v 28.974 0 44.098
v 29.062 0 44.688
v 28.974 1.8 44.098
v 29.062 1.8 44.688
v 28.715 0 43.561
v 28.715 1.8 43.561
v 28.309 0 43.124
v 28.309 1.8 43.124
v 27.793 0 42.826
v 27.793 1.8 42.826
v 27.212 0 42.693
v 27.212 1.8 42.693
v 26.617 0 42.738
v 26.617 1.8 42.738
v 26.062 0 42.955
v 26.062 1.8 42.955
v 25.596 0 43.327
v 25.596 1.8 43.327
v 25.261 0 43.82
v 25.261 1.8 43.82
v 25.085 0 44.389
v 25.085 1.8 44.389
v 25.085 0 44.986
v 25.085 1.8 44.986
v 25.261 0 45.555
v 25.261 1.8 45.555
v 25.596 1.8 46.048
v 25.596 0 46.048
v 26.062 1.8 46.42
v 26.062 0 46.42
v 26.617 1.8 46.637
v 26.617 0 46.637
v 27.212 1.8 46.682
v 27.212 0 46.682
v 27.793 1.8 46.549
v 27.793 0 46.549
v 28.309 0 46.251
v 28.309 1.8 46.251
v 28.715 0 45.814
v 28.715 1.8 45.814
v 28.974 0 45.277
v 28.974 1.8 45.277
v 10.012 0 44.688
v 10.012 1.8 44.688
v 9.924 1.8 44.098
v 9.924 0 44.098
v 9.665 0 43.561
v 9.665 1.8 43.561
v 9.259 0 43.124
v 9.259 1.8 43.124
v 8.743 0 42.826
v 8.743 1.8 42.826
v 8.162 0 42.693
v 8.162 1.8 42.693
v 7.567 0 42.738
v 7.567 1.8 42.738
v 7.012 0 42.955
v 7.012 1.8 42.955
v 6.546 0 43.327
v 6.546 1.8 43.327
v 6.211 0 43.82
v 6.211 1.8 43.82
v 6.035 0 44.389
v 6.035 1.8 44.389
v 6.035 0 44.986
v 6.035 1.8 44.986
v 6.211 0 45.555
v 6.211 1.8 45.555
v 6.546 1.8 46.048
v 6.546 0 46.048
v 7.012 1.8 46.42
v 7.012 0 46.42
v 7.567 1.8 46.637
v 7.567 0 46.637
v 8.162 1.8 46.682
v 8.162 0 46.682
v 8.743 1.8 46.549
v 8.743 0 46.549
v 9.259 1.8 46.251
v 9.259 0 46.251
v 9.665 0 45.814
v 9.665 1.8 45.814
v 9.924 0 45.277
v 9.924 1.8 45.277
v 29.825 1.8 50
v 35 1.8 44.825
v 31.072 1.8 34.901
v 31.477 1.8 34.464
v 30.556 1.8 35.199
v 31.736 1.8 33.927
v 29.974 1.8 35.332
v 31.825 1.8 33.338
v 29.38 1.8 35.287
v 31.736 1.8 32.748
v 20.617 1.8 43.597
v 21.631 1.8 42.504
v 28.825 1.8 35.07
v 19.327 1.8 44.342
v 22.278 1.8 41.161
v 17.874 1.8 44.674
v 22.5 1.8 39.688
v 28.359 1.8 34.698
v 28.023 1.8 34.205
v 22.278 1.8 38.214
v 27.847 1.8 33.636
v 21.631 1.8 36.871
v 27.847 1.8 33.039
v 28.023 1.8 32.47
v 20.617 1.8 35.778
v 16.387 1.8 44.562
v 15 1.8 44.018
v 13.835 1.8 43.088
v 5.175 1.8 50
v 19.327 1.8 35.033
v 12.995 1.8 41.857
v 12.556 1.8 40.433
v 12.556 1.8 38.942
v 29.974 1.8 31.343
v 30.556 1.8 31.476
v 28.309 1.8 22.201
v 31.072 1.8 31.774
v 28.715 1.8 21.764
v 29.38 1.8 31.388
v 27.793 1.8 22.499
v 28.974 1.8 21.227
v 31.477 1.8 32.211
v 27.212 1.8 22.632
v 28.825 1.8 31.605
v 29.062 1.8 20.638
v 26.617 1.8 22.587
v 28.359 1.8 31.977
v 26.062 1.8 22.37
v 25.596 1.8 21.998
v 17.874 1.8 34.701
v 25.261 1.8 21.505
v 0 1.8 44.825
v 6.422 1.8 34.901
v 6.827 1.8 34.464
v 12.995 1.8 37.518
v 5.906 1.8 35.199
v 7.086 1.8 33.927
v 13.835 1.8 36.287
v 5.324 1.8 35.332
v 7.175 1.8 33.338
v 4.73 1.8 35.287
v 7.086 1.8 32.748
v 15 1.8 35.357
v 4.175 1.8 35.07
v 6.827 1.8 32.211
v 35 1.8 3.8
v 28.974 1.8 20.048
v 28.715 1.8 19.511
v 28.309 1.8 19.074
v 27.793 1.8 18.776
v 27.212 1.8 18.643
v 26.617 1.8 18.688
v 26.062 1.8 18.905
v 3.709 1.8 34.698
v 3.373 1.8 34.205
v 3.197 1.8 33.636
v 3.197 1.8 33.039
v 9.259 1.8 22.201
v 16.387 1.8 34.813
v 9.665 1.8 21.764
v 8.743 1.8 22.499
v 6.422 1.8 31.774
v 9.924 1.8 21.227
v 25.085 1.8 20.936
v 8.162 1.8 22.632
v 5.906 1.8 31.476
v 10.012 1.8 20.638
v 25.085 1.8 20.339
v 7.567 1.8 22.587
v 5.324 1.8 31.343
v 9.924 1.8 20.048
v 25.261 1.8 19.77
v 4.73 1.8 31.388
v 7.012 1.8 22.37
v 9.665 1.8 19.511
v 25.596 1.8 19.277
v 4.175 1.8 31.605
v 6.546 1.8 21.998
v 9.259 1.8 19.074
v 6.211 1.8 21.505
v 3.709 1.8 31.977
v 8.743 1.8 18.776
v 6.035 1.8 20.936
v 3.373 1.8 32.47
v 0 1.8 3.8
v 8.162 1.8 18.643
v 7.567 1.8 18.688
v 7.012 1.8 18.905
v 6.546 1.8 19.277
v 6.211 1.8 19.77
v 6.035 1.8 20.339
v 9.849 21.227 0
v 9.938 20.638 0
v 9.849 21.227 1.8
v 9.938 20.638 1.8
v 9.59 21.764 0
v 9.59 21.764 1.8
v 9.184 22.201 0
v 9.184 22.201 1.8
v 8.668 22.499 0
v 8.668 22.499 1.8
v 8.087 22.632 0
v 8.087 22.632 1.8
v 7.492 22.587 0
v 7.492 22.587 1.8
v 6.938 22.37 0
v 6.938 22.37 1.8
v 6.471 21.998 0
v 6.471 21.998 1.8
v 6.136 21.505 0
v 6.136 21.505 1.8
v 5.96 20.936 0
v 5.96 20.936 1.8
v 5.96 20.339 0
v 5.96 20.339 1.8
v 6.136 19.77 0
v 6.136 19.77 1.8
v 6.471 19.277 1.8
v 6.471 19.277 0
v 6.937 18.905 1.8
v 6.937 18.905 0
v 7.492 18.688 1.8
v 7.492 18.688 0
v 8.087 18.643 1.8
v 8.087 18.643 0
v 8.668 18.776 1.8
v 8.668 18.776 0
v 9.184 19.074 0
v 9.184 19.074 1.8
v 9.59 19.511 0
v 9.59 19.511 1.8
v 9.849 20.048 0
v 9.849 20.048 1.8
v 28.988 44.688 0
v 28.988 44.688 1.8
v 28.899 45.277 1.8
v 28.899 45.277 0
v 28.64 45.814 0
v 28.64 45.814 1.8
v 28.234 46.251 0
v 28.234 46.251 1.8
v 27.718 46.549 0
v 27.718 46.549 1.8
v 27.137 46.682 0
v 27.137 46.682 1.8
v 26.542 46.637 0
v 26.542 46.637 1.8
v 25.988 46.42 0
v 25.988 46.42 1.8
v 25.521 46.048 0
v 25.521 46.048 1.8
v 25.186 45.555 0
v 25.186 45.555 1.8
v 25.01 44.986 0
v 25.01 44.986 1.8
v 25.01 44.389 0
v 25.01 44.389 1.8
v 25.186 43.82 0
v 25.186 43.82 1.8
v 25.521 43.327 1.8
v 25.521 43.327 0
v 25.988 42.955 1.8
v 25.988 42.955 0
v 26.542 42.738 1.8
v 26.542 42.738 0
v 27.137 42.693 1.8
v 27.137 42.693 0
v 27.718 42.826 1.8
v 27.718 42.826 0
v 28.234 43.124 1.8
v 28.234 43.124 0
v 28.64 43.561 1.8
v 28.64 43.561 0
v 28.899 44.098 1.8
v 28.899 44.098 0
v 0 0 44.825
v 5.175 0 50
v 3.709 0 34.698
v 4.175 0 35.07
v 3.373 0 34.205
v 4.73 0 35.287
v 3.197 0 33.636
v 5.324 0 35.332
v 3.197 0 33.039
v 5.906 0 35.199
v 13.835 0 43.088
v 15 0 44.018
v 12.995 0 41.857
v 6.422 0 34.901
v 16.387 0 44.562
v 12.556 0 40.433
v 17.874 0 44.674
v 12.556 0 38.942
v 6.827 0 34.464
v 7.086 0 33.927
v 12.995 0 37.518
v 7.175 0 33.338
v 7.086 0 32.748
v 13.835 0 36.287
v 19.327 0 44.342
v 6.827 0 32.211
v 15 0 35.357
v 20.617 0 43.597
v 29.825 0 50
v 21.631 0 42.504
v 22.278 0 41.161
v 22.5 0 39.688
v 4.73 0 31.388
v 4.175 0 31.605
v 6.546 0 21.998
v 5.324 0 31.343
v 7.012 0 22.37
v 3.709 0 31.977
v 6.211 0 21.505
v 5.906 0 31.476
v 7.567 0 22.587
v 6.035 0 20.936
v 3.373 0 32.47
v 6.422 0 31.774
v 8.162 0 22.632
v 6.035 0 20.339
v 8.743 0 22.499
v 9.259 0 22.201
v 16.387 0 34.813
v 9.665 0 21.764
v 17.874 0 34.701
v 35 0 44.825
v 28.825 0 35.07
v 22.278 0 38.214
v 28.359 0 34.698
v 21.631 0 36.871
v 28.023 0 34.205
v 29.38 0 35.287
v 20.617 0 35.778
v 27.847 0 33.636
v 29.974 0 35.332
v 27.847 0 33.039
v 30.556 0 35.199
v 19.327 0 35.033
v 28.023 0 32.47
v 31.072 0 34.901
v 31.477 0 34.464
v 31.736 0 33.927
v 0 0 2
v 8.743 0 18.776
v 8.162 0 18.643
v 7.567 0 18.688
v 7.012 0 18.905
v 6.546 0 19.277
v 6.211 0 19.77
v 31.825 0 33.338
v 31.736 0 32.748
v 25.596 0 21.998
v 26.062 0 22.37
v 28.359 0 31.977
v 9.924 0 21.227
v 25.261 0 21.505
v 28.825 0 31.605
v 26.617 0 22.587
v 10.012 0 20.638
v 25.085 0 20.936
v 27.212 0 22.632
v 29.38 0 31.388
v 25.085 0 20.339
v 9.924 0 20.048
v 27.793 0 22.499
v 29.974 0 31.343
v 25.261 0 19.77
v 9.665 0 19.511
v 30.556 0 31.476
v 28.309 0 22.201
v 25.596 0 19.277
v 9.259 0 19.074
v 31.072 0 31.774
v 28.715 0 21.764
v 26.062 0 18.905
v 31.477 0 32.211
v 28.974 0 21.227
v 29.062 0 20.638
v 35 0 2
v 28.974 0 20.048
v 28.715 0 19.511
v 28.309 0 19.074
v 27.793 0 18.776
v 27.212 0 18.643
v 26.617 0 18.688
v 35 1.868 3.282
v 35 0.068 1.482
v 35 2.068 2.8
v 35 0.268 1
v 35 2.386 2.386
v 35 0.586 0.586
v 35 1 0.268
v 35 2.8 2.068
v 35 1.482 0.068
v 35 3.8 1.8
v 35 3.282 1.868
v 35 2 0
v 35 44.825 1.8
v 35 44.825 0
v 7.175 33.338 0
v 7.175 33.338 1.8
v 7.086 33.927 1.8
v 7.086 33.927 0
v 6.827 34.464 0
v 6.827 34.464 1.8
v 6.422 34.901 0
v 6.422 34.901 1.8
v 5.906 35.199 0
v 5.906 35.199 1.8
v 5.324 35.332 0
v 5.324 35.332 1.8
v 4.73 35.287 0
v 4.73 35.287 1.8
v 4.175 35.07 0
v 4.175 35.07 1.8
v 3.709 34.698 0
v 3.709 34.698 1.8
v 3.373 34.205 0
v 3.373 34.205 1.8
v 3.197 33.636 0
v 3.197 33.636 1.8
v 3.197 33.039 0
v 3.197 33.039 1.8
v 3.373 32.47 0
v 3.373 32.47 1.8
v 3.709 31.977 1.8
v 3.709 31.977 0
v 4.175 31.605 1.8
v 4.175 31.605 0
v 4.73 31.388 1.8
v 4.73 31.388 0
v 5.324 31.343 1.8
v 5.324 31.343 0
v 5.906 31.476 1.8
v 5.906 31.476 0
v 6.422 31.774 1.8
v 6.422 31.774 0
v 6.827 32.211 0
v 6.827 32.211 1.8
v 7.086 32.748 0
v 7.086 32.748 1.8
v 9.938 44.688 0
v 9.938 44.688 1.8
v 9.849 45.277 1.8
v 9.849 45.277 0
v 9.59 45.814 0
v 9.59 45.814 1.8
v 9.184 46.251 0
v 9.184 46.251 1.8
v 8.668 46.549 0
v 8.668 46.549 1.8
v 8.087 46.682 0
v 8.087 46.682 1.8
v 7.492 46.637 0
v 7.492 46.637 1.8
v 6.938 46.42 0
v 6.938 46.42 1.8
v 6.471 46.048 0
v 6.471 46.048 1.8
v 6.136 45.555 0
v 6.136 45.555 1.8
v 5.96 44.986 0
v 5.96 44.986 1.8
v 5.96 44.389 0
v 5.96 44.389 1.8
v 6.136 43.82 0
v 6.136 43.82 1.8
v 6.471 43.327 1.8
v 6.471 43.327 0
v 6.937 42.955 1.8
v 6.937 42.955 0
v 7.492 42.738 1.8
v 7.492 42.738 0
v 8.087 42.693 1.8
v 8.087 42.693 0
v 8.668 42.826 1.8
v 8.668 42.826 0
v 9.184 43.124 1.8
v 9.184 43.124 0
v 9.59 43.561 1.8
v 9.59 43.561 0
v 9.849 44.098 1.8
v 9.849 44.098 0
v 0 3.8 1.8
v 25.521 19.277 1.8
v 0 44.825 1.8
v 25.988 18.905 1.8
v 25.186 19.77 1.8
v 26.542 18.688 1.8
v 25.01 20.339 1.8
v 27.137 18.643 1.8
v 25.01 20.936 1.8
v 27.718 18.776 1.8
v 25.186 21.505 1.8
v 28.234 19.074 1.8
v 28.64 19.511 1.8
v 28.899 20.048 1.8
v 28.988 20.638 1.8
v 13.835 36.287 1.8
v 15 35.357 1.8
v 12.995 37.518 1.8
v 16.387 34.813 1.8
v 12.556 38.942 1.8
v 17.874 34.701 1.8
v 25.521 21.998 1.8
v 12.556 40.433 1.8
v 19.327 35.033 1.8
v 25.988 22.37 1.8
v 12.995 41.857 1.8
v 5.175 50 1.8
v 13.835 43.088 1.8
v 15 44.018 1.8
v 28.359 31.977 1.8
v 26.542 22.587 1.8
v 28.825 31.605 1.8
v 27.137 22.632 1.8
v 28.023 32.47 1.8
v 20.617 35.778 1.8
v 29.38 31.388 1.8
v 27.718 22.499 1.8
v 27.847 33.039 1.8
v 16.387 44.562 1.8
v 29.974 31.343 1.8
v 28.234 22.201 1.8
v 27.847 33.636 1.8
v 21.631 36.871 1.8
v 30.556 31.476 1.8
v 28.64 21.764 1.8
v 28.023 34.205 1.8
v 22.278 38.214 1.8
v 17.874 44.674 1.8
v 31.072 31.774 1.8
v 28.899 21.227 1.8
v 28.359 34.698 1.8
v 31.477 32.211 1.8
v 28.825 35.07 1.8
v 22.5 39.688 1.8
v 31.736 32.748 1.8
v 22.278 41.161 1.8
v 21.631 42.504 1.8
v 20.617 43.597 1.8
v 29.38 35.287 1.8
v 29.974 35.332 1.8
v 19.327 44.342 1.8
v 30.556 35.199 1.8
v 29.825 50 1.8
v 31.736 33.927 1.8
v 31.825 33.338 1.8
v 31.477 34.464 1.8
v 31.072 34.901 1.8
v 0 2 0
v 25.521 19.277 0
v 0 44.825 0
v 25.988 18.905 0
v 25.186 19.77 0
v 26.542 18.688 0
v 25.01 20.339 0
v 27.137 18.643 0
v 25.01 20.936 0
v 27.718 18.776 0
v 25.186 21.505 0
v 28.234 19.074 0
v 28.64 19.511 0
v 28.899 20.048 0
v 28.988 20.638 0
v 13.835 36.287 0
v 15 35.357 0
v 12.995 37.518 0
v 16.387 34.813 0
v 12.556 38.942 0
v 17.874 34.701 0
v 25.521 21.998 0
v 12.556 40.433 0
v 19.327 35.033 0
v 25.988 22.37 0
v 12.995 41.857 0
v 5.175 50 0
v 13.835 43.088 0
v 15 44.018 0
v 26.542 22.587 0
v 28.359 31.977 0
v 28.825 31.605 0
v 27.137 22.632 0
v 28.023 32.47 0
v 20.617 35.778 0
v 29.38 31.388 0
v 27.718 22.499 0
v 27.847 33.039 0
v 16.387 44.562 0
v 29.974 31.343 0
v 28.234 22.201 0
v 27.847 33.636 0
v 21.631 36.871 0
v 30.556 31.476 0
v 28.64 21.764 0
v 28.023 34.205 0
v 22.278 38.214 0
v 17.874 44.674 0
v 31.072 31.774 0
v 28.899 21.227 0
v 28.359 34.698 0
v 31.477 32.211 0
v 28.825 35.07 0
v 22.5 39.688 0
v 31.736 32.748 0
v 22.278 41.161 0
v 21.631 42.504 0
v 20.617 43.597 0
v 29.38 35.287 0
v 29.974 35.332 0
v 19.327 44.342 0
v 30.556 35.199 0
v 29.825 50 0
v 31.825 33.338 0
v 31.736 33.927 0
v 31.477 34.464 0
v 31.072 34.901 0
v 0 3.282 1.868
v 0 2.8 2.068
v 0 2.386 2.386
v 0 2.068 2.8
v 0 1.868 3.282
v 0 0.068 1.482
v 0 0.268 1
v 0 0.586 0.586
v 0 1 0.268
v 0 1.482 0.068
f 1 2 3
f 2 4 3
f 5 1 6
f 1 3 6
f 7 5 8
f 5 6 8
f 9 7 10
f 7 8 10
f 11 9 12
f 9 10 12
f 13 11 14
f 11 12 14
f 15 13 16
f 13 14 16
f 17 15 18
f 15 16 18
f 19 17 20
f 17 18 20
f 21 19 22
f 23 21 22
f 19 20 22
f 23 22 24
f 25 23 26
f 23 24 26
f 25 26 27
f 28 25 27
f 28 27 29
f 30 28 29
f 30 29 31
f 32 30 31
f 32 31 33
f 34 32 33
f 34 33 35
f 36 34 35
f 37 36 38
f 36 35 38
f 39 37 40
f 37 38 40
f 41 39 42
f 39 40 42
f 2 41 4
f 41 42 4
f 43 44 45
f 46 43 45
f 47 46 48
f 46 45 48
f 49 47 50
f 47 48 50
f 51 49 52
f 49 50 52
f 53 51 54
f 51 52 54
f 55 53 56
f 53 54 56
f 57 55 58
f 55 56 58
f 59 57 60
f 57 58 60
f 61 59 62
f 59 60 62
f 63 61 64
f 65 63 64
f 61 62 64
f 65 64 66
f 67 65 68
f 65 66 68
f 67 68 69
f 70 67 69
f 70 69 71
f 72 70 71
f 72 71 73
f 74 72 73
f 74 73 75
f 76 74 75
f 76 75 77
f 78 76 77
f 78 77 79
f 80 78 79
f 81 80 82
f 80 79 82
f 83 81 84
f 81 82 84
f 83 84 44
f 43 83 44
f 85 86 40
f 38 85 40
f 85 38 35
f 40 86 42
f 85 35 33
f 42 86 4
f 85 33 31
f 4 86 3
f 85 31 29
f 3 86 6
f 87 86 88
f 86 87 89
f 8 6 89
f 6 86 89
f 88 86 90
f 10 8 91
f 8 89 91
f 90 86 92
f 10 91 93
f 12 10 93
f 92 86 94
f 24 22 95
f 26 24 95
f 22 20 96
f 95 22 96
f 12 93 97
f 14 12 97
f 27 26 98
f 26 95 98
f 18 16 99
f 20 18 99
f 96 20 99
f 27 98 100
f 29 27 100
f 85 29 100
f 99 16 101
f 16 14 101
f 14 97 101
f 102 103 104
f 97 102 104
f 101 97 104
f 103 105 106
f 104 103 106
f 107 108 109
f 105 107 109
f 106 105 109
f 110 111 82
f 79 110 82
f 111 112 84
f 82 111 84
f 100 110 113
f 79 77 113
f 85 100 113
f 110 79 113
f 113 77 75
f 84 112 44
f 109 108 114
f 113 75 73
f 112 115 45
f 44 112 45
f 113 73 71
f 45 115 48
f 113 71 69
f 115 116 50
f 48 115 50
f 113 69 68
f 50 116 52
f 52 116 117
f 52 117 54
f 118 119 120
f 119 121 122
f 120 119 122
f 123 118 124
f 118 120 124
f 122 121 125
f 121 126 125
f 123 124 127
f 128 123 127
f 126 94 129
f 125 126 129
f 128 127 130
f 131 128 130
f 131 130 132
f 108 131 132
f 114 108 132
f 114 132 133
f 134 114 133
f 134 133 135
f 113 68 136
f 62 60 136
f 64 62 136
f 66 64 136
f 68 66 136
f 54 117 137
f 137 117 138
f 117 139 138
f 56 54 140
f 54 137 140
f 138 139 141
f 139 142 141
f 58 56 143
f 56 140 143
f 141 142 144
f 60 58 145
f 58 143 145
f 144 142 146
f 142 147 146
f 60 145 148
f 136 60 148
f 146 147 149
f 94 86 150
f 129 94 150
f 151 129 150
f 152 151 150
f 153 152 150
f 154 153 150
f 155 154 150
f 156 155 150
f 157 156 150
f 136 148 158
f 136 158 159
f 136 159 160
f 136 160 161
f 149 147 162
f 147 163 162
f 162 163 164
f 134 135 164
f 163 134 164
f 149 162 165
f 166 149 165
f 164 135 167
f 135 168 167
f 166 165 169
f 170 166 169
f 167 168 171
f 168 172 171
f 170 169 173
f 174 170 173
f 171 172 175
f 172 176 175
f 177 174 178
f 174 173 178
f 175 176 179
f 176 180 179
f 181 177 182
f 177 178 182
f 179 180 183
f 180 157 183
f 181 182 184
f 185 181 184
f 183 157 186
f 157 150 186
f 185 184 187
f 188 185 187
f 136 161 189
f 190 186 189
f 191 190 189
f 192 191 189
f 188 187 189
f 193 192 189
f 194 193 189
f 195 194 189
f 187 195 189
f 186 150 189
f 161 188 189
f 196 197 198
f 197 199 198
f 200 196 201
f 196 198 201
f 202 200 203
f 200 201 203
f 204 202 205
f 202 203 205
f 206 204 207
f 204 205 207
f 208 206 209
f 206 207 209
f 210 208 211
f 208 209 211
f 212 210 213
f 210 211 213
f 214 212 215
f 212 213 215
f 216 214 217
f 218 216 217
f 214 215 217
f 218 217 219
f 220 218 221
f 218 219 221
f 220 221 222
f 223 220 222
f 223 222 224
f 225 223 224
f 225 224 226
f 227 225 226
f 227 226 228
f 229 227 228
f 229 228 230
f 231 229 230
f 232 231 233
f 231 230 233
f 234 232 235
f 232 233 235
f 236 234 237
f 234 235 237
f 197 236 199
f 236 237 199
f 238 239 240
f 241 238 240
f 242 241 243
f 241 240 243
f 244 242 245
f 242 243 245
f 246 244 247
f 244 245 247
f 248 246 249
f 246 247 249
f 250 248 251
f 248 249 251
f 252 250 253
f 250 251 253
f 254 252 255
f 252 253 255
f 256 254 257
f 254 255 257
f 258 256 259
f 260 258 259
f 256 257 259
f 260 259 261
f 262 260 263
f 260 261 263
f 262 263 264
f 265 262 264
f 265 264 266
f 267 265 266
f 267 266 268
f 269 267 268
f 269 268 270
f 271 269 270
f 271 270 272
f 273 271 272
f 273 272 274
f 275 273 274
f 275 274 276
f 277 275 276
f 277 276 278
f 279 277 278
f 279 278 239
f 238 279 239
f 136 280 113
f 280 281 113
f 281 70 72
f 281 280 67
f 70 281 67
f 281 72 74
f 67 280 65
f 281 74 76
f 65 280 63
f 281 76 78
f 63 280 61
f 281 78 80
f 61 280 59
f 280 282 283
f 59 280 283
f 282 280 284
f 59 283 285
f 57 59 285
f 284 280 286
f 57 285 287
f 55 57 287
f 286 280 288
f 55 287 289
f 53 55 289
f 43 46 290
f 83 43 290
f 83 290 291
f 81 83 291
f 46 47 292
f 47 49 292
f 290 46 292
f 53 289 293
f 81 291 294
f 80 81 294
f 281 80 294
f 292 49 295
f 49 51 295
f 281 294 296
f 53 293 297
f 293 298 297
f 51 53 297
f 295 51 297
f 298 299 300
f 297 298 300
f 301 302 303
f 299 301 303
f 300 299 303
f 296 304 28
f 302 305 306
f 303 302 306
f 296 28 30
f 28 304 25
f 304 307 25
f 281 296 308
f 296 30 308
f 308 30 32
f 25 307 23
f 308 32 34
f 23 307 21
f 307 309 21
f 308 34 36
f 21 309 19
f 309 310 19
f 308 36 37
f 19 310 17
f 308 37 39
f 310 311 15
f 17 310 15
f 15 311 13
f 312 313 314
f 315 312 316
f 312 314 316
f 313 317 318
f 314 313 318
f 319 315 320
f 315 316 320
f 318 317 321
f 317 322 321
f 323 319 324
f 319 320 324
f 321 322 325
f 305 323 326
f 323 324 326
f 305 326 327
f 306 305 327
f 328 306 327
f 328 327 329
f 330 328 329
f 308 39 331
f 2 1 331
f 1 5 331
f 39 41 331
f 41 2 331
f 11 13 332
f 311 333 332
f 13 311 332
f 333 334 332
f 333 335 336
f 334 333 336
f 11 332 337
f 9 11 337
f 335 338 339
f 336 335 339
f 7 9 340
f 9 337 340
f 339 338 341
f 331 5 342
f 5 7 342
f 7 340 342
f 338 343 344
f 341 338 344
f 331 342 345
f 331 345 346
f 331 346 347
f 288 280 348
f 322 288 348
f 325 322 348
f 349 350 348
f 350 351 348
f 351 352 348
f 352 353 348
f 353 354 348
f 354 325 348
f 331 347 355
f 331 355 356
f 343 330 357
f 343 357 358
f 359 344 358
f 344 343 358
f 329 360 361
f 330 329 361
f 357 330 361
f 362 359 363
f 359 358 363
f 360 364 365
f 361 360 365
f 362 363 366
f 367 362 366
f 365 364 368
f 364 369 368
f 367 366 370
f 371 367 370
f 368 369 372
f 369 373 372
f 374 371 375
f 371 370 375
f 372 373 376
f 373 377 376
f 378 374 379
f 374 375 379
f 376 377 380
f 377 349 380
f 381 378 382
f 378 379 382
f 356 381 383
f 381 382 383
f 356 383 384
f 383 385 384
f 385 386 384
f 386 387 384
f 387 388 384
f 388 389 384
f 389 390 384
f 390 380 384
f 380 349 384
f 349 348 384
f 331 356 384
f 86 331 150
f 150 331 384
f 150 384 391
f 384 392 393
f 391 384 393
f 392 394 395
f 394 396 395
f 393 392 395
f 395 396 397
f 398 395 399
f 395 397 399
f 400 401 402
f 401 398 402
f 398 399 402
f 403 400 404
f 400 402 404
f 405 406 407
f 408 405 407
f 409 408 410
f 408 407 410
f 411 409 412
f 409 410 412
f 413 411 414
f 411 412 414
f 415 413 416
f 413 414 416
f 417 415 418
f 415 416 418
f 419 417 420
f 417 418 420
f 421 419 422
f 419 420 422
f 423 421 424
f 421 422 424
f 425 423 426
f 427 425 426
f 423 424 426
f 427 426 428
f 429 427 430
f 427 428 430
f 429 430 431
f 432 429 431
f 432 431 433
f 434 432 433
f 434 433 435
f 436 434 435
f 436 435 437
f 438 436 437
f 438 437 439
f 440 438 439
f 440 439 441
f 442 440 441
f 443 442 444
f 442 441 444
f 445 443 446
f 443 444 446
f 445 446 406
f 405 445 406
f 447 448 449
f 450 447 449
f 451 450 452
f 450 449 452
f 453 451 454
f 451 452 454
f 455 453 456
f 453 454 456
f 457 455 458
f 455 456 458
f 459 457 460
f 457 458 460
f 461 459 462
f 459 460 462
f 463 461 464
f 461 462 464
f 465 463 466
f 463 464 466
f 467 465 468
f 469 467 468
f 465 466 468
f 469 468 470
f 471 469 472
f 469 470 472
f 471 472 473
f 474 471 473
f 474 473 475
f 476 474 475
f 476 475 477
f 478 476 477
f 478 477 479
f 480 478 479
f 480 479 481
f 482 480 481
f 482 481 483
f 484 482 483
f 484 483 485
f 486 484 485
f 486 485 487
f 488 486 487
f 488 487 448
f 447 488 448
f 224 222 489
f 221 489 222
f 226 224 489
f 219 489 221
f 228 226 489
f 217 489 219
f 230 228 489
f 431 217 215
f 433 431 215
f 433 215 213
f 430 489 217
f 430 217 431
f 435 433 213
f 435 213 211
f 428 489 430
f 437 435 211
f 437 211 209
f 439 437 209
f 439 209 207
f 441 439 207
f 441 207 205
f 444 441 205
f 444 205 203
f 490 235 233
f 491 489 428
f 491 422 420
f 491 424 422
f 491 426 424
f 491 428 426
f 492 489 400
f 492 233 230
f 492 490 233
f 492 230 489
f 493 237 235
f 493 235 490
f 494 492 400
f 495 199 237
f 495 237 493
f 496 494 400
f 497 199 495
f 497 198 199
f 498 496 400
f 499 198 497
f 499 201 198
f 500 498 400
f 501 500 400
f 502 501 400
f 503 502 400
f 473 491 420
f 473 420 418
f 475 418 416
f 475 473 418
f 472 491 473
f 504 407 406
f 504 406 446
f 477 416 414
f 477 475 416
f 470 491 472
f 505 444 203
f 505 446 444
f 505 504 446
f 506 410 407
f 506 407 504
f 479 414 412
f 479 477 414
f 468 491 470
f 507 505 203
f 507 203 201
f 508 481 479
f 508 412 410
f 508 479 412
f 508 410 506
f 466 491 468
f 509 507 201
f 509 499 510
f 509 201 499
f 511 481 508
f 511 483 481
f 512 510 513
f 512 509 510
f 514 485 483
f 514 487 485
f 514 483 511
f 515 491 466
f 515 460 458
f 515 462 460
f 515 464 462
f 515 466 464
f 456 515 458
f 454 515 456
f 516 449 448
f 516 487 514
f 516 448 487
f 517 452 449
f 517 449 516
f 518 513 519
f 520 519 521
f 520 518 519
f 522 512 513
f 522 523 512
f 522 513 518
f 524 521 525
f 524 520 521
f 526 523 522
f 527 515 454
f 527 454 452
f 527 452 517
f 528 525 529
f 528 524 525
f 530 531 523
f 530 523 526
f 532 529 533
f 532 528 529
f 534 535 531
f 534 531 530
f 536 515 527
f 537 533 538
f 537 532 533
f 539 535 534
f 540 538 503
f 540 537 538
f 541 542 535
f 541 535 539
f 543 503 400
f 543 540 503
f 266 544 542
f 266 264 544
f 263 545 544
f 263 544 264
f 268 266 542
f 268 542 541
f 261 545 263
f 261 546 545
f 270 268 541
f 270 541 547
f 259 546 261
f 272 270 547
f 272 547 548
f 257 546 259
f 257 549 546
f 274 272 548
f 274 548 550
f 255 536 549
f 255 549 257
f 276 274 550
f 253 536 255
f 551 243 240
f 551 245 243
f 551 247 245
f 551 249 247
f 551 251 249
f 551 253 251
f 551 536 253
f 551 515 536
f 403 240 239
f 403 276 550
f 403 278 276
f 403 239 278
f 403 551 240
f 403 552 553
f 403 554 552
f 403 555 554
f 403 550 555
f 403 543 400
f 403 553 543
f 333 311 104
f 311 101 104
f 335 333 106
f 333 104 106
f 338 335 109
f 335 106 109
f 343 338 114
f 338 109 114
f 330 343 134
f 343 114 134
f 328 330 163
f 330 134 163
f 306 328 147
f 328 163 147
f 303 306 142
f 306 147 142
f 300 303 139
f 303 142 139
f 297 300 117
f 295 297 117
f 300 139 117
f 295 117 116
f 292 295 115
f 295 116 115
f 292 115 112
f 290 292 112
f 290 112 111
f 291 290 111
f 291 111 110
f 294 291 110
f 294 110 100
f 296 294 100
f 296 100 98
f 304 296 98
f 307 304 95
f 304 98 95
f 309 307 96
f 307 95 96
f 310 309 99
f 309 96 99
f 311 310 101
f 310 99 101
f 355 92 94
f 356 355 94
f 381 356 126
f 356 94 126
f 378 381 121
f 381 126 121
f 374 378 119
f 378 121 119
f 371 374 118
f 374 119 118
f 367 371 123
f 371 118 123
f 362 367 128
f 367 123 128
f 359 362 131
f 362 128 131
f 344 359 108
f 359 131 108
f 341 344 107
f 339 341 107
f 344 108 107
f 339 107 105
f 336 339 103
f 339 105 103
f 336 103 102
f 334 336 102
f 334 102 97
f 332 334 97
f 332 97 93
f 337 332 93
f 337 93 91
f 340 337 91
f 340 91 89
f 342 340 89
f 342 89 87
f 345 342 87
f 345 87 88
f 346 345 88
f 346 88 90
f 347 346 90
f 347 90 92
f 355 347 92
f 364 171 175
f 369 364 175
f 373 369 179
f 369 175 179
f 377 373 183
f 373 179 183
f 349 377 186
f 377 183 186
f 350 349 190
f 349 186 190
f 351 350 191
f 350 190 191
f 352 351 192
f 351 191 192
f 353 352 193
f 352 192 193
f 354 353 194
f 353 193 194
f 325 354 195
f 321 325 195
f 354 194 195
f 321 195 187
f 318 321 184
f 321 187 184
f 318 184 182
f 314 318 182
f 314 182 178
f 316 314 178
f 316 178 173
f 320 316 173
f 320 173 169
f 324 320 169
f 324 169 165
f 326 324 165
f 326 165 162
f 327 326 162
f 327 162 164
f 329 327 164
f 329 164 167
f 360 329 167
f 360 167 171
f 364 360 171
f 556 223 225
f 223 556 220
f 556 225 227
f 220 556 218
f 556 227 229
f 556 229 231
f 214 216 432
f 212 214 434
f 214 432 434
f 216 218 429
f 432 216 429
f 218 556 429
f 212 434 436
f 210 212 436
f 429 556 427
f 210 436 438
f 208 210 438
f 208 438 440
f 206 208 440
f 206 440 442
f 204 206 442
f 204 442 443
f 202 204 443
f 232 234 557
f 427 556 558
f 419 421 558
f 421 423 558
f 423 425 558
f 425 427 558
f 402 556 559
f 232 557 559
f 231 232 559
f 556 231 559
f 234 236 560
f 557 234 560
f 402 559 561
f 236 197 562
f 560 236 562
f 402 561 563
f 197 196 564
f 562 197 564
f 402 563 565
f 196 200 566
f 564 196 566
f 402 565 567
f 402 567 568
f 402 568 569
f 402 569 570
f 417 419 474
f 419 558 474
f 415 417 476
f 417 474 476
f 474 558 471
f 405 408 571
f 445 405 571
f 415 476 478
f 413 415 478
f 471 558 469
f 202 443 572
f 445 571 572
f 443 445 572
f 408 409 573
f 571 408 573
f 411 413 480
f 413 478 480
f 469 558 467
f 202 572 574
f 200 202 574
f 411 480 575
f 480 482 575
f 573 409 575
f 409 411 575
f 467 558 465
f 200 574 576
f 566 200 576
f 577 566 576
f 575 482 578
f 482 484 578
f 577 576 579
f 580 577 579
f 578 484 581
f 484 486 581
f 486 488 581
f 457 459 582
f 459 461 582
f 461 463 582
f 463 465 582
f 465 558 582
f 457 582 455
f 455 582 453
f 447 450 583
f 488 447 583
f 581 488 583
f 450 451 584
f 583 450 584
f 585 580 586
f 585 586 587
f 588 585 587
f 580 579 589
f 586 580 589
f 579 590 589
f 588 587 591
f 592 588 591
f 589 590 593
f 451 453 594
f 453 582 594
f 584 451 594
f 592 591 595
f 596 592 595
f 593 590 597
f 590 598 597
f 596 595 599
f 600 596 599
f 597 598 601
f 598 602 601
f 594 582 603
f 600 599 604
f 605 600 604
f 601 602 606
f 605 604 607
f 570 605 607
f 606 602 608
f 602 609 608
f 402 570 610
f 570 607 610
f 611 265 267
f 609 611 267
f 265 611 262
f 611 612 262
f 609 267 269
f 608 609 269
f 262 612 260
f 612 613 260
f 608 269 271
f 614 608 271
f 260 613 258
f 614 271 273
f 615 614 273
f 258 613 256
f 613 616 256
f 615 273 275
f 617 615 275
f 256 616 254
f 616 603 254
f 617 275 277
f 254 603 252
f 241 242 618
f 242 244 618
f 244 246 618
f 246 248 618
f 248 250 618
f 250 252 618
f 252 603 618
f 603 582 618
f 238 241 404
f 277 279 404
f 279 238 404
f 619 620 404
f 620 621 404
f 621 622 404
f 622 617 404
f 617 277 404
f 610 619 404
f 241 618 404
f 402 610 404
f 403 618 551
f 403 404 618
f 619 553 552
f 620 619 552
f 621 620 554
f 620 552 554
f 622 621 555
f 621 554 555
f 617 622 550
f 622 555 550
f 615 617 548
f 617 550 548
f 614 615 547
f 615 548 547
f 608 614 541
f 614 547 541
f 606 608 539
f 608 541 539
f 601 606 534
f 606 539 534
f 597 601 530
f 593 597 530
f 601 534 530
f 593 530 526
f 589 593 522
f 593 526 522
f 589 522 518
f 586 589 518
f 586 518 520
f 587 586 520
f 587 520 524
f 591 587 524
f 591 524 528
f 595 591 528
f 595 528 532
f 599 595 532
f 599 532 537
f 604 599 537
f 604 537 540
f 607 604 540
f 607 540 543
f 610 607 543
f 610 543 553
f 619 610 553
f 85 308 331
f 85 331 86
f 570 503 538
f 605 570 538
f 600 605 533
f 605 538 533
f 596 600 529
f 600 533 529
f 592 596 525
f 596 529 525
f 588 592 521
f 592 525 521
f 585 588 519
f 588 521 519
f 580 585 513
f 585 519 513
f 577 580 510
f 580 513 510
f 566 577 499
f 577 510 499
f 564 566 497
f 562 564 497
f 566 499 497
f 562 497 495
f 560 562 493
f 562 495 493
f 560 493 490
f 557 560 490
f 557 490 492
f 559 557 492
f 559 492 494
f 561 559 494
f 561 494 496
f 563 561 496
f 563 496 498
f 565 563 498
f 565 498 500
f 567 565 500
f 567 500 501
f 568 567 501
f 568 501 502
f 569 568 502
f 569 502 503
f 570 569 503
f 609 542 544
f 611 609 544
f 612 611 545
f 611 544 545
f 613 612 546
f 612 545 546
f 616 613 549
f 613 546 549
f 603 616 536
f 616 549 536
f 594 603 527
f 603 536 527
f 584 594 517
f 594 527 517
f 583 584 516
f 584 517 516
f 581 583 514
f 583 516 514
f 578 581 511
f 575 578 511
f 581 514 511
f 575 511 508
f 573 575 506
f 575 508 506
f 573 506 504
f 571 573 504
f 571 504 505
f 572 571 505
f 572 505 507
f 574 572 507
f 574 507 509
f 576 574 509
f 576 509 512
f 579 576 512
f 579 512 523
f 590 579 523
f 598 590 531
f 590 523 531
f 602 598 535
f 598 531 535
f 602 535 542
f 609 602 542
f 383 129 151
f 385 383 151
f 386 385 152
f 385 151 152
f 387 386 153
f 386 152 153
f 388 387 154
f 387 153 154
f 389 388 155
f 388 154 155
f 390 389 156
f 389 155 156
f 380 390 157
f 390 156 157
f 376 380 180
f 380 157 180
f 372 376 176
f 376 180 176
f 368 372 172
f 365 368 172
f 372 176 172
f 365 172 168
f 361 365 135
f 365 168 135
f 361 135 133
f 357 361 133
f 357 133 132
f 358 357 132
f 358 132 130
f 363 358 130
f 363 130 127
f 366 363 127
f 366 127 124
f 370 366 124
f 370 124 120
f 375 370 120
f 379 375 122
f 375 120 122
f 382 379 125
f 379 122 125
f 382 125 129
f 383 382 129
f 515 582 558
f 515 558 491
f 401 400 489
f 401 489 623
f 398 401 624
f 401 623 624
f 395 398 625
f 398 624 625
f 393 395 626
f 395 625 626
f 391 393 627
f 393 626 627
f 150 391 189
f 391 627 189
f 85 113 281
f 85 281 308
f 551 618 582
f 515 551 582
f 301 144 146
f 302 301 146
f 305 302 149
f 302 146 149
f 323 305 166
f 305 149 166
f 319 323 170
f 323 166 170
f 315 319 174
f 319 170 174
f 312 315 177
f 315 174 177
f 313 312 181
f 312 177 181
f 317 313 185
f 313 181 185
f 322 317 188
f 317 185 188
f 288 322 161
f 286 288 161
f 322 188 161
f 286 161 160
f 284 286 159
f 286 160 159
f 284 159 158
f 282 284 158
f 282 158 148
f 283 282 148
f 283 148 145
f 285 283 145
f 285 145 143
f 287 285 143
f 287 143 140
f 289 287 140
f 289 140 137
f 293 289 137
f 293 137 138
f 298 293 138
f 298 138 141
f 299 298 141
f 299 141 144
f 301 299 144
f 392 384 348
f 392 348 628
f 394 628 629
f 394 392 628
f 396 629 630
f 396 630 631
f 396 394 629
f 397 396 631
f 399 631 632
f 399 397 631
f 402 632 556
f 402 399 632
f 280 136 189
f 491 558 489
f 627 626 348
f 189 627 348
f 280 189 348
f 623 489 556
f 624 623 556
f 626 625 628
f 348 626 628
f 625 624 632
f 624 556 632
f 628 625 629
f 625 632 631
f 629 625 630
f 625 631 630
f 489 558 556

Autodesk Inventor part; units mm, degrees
ref_plane "YZ Plane" through (0, 0, 0) normal (1, 0, 0) x (0, 1, 0)
ref_plane "XZ Plane" through (0, 0, 0) normal (0, 1, 0) x (-1, 0, 0)
ref_plane "XY Plane" through (0, 0, 0) normal (0, 0, 1) x (1, 0, 0)
sketch "Эскиз1" plane through (0, 0, 0) normal (0, 0, 1) x (1, 0, 0)
  line L0 (0, 0) -> (35, 0)
  line L1 (35, 0) -> (35, 50)
  line L2 (35, 50) -> (0, 50)
  line L3 (0, 50) -> (0, 0)
  dimension "d0" = 35
  dimension "d1" = 50
extrude "Выдавливание1" add sketch "Эскиз1" along normal blind 1.8
sketch "Эскиз2" plane through (0, 0, 1.8) normal (0, 0, 1) x (1, 0, 0)
  line L0 (0, 0) -> (35, 0)
  line L1 (35, 0) -> (35, 1.8)
  line L2 (35, 1.8) -> (0, 1.8)
  line L3 (0, 1.8) -> (0, 0)
  dimension "d5" = 35
  dimension "d6" = 1.8
extrude "Выдавливание2" add sketch "Эскиз2" along normal blind 48.2
fillet "Сопряжение1" radius 2 2 edges at (17.5, 1.8, 1.8) (17.5, 0, 0)
chamfer "Фаска1" distance 5.175 angle 45 4 edges at (0, 50, 0.9) (0, 0.9, 50) (35, 0.9, 50) (35, 50, 0.9)
sketch "Эскиз3" plane through (0, 0, 1.8) normal (0, 0, 1) x (1, 0, 0)
  line L0 (29.825, 50) -> (5.175, 50) projected
  line L1 (17.5, 50) -> (17.5, 1.8)
  line L2 (0, 1.8) -> (35, 1.8) projected
  line L3 (29.825, 50) -> (5.175, 50) projected
  circle A0 centre (17.5, 39.6875) radius 5
  circle A1 centre (7.9375, 44.6875) radius 2
  circle A2 centre (26.9875, 44.6875) radius 2
  circle A3 centre (5.175, 33.3375) radius 2
  circle A4 centre (29.825, 33.3375) radius 2
  circle A5 centre (7.9375, 20.6375) radius 2
  circle A6 centre (26.9875, 20.6375) radius 2
  point P0 (0, 0)
  dimension "d14" = 10
  dimension "d15" = 4
  dimension "d16" = 4
  dimension "d17" = 4
  dimension "d18" = 4
  dimension "d19" = 4
  dimension "d20" = 4
extrude "Выдавливание3" cut sketch "Эскиз3" against normal blind 48.2
sketch "Эскиз4" plane through (0, 1.8, 3.8) normal (0, 1, 0) x (1, 0, 0)
  line L0 (5.175, -46.2) -> (29.825, -46.2)
  line L1 (5.175, -46.2) -> (29.825, -46.2)
  circle A0 centre (17.5, -35.8875) radius 5
  circle A1 centre (27.0625, -40.8875) radius 2
  circle A2 centre (8.0125, -40.8875) radius 2
  circle A3 centre (29.825, -29.5375) radius 2
  circle A4 centre (5.175, -29.5375) radius 2
  circle A5 centre (27.0625, -16.8375) radius 2
  circle A6 centre (8.0125, -16.8375) radius 2
  line L2 (29.825, -46.2) -> (5.175, -46.2) projected
  point P0 (0, 3.8)
  point P1 (17.5, -46.2)
  dimension "d23" = 10
  dimension "d24" = 4
  dimension "d25" = 4
  dimension "d26" = 4
  dimension "d27" = 4
  dimension "d28" = 4
  dimension "d29" = 4
extrude "Выдавливание4" cut sketch "Эскиз4" against normal blind 48.2
properties part number "угол для катушки"
